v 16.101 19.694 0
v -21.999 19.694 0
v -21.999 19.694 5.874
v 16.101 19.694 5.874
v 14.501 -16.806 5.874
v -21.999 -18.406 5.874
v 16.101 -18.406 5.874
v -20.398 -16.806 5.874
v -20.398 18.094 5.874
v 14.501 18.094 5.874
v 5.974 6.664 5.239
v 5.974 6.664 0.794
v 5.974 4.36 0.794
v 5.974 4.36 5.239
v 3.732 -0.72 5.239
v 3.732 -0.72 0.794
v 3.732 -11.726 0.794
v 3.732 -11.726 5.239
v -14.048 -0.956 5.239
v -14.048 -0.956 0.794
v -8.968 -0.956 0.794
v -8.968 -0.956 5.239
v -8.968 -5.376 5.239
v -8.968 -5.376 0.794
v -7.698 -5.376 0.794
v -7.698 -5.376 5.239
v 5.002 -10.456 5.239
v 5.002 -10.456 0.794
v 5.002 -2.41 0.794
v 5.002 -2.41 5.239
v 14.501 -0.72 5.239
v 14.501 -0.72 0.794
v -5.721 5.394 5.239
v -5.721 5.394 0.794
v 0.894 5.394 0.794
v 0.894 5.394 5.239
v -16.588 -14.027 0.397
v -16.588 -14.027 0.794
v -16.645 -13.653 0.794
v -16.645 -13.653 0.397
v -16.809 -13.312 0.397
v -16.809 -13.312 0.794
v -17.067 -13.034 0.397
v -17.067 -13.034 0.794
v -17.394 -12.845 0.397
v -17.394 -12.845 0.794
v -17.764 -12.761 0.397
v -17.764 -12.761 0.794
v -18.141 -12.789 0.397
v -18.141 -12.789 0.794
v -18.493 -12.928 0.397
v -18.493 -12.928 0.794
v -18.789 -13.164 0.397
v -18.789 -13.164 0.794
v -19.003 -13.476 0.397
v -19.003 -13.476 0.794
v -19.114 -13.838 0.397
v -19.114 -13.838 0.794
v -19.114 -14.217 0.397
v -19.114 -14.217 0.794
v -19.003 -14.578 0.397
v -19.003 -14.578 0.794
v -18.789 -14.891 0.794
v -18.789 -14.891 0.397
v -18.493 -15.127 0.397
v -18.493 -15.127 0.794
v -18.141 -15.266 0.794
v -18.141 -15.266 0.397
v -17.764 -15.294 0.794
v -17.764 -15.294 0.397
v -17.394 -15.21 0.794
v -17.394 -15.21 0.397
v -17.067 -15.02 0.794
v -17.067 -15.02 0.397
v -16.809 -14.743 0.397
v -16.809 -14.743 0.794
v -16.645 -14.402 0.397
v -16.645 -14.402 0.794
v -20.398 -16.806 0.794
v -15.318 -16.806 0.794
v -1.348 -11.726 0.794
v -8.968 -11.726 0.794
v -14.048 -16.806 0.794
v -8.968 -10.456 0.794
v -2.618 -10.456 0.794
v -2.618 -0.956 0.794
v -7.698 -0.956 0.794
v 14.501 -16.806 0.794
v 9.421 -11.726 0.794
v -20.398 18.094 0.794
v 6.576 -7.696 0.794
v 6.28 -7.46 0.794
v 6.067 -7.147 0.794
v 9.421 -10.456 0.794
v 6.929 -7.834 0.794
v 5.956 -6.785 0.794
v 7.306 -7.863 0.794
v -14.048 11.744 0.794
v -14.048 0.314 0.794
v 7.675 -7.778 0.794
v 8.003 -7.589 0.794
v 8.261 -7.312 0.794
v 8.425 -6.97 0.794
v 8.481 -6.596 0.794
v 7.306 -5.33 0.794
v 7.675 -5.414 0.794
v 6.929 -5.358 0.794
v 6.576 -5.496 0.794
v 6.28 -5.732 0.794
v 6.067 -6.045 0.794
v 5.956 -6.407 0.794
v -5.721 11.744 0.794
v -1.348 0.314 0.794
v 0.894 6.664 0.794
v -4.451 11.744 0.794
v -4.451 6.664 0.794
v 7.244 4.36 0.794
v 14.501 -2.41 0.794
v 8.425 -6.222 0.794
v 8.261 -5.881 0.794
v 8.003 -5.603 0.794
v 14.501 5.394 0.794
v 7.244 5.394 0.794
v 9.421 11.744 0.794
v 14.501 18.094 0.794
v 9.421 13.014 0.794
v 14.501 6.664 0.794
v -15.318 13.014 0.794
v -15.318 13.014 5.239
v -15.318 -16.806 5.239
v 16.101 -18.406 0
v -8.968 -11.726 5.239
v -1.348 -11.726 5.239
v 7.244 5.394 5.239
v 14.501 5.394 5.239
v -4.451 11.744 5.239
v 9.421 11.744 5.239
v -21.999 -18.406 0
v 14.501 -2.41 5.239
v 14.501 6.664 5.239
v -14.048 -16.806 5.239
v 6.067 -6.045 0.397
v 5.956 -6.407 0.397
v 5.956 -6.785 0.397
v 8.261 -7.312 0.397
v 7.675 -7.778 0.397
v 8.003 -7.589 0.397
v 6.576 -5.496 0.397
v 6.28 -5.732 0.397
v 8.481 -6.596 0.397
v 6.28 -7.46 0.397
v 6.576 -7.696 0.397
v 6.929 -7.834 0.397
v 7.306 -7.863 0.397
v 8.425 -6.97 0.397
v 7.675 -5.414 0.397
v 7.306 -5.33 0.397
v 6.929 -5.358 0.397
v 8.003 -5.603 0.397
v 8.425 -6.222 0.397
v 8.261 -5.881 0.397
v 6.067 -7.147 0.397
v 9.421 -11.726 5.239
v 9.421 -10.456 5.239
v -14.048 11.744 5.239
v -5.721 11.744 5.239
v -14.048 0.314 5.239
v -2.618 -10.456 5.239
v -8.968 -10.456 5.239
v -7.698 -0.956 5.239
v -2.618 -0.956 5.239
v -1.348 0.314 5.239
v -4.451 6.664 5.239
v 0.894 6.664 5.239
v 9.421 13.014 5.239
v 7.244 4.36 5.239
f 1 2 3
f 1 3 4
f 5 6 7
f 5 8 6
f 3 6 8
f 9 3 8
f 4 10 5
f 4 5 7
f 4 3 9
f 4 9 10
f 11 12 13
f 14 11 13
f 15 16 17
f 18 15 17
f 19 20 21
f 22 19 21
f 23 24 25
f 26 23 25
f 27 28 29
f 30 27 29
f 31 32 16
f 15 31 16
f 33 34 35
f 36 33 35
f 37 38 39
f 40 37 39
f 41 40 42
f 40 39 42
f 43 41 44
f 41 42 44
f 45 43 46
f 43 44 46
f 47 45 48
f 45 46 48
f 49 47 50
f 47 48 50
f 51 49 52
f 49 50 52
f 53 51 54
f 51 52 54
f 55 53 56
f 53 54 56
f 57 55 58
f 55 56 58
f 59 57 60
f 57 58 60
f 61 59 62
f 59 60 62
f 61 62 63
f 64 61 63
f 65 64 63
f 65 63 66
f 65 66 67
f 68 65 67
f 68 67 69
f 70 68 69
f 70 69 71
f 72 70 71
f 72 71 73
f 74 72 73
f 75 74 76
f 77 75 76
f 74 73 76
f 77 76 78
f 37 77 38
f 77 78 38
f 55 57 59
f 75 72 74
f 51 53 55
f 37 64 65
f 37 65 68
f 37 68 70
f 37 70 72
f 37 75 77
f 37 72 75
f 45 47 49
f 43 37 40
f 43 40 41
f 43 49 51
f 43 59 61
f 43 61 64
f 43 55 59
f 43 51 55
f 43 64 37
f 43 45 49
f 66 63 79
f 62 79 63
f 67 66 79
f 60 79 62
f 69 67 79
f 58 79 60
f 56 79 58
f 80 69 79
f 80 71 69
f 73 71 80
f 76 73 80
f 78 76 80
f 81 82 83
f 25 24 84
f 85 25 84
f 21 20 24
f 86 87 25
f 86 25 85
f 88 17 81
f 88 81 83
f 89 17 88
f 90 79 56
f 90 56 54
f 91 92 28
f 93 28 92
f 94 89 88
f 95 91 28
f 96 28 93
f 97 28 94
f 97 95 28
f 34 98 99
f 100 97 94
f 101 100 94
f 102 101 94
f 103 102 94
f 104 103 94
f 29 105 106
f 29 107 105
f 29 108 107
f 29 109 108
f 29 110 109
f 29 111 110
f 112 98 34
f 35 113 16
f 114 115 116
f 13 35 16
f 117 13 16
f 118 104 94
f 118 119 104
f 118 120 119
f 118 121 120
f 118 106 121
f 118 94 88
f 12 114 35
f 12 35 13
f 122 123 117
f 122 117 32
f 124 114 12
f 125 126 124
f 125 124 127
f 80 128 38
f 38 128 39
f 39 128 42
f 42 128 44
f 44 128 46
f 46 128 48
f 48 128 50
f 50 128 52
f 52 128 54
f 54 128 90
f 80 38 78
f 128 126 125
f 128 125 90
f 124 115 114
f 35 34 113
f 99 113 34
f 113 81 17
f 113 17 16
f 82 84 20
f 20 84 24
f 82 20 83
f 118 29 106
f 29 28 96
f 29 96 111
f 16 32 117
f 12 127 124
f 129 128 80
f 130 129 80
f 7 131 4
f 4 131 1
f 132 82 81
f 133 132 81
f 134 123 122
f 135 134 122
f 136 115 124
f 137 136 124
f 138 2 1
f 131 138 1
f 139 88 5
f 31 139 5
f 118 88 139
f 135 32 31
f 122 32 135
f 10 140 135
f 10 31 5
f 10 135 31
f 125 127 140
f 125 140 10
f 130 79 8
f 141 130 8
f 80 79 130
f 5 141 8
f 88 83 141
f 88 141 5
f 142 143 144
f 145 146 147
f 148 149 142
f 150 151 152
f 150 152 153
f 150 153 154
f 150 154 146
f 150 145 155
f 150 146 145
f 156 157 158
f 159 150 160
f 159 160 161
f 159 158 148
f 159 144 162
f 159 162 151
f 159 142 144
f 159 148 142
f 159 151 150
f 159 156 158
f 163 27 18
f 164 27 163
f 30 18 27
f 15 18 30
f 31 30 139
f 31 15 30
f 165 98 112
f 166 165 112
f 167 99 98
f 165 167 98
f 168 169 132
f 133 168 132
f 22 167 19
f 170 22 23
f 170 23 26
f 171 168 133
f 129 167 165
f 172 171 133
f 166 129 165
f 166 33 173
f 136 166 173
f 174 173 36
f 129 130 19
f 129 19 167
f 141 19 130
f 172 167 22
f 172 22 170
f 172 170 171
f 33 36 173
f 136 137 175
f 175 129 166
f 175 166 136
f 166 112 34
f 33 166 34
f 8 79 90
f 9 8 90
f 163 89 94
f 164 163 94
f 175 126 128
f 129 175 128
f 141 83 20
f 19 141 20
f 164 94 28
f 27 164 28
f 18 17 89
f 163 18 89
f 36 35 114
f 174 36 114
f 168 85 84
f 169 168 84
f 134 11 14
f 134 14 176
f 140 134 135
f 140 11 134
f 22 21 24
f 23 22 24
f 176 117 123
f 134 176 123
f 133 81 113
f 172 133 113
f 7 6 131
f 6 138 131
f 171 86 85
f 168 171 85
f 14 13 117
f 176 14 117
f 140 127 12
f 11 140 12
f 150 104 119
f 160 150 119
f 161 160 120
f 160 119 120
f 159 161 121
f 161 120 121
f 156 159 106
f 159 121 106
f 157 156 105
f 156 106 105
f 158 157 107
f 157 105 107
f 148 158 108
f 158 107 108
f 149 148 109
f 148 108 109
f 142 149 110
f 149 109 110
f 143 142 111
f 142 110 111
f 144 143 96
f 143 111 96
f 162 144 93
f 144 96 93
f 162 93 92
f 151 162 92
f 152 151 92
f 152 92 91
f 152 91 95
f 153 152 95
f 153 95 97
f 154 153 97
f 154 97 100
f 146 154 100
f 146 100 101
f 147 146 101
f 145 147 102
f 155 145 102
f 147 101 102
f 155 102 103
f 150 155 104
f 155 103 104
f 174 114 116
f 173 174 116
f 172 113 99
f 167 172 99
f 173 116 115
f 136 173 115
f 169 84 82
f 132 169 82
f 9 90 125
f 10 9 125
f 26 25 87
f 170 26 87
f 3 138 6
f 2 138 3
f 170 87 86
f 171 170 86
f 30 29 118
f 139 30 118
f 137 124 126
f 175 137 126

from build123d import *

# Parameters (mm, degrees)
F0_W     = 38.1
F0_H     = 38.1
F1_DEPTH = 0.79375
F2_W     = 38.1
F2_H     = 38.1
F2_W_2   = 34.8996
F2_H_2   = 34.8996
F3_DEPTH = 5.08
F4_R     = 1.27
F5_DEPTH = 0.396875
F6_DEPTH = 4.445


with BuildPart() as f1:
    # F0 (on Top) → F1 (new body)
    with BuildSketch(Plane.XY):
        with Locations((-2.948644, 0.644133)):
            Rectangle(F0_W, F0_H)
    extrude(amount=F1_DEPTH)

    # F2 (on face) → F3 (join)
    with BuildSketch(Plane.XY.offset(0.79375)):
        with Locations((-2.948644, 0.644133)):
            Rectangle(F2_W, F2_H)
        with Locations((-2.948644, 0.644133)):
            Rectangle(F2_W_2, F2_H_2, mode=Mode.SUBTRACT)
    extrude(amount=F3_DEPTH)

    # F4 (on face) → F5 (cut)
    with BuildSketch(Plane.XY.offset(0.79375)):
        with Locations((-17.858444, -14.027401)):
            Circle(F4_R)
        with Locations((7.211356, -6.596157)):
            Circle(F4_R)
    extrude(amount=-F5_DEPTH, mode=Mode.SUBTRACT)

    # F4 (on face) → F6 (join)
    with BuildSketch(Plane.XY.offset(0.79375)):
        Polygon((-15.318444, 13.013933), (-15.318444, -16.805667), (-14.048444, -16.805667), (-14.048444, -0.956067), (-8.968444, -0.956067), (-8.968444, -5.375667), (-7.698444, -5.375667), (-7.698444, -0.956067), (-2.618444, -0.956067), (-2.618444, -10.455667), (-8.968444, -10.455667), (-8.968444, -11.725667), (-2.618444, -11.725667), (-1.348444, -11.725667), (-1.348444, -0.956067), (-1.348444, 0.313933), (-14.048444, 0.313933), (-14.048444, 11.743933), (-5.721033, 11.743933), (-5.721033, 6.663933), (-5.721033, 5.393933), (-4.451033, 5.393933), (0.894486, 5.393933), (0.894486, 6.663933), (-4.451033, 6.663933), (-4.451033, 11.743933), (9.421156, 11.743933), (9.421156, 13.013933), (-14.048444, 13.013933), align=None)
        Polygon((5.001556, -2.410417), (14.501156, -2.410417), (14.501156, -0.719784), (12.663512, -0.719784), (5.001556, -0.719784), (3.731556, -0.719784), (3.731556, -2.410417), (3.731556, -10.455667), (3.731556, -11.725667), (5.001556, -11.725667), (9.421156, -11.725667), (9.421156, -10.455667), (5.001556, -10.455667), align=None)
        Polygon((14.501156, 5.393933), (14.501156, 6.663933), (7.077073, 6.663933), (5.974486, 6.663933), (5.974486, 5.393933), (5.974486, 4.360216), (7.244486, 4.360216), (7.244486, 5.393933), align=None)
    extrude(amount=F6_DEPTH)


solid = f1.part
